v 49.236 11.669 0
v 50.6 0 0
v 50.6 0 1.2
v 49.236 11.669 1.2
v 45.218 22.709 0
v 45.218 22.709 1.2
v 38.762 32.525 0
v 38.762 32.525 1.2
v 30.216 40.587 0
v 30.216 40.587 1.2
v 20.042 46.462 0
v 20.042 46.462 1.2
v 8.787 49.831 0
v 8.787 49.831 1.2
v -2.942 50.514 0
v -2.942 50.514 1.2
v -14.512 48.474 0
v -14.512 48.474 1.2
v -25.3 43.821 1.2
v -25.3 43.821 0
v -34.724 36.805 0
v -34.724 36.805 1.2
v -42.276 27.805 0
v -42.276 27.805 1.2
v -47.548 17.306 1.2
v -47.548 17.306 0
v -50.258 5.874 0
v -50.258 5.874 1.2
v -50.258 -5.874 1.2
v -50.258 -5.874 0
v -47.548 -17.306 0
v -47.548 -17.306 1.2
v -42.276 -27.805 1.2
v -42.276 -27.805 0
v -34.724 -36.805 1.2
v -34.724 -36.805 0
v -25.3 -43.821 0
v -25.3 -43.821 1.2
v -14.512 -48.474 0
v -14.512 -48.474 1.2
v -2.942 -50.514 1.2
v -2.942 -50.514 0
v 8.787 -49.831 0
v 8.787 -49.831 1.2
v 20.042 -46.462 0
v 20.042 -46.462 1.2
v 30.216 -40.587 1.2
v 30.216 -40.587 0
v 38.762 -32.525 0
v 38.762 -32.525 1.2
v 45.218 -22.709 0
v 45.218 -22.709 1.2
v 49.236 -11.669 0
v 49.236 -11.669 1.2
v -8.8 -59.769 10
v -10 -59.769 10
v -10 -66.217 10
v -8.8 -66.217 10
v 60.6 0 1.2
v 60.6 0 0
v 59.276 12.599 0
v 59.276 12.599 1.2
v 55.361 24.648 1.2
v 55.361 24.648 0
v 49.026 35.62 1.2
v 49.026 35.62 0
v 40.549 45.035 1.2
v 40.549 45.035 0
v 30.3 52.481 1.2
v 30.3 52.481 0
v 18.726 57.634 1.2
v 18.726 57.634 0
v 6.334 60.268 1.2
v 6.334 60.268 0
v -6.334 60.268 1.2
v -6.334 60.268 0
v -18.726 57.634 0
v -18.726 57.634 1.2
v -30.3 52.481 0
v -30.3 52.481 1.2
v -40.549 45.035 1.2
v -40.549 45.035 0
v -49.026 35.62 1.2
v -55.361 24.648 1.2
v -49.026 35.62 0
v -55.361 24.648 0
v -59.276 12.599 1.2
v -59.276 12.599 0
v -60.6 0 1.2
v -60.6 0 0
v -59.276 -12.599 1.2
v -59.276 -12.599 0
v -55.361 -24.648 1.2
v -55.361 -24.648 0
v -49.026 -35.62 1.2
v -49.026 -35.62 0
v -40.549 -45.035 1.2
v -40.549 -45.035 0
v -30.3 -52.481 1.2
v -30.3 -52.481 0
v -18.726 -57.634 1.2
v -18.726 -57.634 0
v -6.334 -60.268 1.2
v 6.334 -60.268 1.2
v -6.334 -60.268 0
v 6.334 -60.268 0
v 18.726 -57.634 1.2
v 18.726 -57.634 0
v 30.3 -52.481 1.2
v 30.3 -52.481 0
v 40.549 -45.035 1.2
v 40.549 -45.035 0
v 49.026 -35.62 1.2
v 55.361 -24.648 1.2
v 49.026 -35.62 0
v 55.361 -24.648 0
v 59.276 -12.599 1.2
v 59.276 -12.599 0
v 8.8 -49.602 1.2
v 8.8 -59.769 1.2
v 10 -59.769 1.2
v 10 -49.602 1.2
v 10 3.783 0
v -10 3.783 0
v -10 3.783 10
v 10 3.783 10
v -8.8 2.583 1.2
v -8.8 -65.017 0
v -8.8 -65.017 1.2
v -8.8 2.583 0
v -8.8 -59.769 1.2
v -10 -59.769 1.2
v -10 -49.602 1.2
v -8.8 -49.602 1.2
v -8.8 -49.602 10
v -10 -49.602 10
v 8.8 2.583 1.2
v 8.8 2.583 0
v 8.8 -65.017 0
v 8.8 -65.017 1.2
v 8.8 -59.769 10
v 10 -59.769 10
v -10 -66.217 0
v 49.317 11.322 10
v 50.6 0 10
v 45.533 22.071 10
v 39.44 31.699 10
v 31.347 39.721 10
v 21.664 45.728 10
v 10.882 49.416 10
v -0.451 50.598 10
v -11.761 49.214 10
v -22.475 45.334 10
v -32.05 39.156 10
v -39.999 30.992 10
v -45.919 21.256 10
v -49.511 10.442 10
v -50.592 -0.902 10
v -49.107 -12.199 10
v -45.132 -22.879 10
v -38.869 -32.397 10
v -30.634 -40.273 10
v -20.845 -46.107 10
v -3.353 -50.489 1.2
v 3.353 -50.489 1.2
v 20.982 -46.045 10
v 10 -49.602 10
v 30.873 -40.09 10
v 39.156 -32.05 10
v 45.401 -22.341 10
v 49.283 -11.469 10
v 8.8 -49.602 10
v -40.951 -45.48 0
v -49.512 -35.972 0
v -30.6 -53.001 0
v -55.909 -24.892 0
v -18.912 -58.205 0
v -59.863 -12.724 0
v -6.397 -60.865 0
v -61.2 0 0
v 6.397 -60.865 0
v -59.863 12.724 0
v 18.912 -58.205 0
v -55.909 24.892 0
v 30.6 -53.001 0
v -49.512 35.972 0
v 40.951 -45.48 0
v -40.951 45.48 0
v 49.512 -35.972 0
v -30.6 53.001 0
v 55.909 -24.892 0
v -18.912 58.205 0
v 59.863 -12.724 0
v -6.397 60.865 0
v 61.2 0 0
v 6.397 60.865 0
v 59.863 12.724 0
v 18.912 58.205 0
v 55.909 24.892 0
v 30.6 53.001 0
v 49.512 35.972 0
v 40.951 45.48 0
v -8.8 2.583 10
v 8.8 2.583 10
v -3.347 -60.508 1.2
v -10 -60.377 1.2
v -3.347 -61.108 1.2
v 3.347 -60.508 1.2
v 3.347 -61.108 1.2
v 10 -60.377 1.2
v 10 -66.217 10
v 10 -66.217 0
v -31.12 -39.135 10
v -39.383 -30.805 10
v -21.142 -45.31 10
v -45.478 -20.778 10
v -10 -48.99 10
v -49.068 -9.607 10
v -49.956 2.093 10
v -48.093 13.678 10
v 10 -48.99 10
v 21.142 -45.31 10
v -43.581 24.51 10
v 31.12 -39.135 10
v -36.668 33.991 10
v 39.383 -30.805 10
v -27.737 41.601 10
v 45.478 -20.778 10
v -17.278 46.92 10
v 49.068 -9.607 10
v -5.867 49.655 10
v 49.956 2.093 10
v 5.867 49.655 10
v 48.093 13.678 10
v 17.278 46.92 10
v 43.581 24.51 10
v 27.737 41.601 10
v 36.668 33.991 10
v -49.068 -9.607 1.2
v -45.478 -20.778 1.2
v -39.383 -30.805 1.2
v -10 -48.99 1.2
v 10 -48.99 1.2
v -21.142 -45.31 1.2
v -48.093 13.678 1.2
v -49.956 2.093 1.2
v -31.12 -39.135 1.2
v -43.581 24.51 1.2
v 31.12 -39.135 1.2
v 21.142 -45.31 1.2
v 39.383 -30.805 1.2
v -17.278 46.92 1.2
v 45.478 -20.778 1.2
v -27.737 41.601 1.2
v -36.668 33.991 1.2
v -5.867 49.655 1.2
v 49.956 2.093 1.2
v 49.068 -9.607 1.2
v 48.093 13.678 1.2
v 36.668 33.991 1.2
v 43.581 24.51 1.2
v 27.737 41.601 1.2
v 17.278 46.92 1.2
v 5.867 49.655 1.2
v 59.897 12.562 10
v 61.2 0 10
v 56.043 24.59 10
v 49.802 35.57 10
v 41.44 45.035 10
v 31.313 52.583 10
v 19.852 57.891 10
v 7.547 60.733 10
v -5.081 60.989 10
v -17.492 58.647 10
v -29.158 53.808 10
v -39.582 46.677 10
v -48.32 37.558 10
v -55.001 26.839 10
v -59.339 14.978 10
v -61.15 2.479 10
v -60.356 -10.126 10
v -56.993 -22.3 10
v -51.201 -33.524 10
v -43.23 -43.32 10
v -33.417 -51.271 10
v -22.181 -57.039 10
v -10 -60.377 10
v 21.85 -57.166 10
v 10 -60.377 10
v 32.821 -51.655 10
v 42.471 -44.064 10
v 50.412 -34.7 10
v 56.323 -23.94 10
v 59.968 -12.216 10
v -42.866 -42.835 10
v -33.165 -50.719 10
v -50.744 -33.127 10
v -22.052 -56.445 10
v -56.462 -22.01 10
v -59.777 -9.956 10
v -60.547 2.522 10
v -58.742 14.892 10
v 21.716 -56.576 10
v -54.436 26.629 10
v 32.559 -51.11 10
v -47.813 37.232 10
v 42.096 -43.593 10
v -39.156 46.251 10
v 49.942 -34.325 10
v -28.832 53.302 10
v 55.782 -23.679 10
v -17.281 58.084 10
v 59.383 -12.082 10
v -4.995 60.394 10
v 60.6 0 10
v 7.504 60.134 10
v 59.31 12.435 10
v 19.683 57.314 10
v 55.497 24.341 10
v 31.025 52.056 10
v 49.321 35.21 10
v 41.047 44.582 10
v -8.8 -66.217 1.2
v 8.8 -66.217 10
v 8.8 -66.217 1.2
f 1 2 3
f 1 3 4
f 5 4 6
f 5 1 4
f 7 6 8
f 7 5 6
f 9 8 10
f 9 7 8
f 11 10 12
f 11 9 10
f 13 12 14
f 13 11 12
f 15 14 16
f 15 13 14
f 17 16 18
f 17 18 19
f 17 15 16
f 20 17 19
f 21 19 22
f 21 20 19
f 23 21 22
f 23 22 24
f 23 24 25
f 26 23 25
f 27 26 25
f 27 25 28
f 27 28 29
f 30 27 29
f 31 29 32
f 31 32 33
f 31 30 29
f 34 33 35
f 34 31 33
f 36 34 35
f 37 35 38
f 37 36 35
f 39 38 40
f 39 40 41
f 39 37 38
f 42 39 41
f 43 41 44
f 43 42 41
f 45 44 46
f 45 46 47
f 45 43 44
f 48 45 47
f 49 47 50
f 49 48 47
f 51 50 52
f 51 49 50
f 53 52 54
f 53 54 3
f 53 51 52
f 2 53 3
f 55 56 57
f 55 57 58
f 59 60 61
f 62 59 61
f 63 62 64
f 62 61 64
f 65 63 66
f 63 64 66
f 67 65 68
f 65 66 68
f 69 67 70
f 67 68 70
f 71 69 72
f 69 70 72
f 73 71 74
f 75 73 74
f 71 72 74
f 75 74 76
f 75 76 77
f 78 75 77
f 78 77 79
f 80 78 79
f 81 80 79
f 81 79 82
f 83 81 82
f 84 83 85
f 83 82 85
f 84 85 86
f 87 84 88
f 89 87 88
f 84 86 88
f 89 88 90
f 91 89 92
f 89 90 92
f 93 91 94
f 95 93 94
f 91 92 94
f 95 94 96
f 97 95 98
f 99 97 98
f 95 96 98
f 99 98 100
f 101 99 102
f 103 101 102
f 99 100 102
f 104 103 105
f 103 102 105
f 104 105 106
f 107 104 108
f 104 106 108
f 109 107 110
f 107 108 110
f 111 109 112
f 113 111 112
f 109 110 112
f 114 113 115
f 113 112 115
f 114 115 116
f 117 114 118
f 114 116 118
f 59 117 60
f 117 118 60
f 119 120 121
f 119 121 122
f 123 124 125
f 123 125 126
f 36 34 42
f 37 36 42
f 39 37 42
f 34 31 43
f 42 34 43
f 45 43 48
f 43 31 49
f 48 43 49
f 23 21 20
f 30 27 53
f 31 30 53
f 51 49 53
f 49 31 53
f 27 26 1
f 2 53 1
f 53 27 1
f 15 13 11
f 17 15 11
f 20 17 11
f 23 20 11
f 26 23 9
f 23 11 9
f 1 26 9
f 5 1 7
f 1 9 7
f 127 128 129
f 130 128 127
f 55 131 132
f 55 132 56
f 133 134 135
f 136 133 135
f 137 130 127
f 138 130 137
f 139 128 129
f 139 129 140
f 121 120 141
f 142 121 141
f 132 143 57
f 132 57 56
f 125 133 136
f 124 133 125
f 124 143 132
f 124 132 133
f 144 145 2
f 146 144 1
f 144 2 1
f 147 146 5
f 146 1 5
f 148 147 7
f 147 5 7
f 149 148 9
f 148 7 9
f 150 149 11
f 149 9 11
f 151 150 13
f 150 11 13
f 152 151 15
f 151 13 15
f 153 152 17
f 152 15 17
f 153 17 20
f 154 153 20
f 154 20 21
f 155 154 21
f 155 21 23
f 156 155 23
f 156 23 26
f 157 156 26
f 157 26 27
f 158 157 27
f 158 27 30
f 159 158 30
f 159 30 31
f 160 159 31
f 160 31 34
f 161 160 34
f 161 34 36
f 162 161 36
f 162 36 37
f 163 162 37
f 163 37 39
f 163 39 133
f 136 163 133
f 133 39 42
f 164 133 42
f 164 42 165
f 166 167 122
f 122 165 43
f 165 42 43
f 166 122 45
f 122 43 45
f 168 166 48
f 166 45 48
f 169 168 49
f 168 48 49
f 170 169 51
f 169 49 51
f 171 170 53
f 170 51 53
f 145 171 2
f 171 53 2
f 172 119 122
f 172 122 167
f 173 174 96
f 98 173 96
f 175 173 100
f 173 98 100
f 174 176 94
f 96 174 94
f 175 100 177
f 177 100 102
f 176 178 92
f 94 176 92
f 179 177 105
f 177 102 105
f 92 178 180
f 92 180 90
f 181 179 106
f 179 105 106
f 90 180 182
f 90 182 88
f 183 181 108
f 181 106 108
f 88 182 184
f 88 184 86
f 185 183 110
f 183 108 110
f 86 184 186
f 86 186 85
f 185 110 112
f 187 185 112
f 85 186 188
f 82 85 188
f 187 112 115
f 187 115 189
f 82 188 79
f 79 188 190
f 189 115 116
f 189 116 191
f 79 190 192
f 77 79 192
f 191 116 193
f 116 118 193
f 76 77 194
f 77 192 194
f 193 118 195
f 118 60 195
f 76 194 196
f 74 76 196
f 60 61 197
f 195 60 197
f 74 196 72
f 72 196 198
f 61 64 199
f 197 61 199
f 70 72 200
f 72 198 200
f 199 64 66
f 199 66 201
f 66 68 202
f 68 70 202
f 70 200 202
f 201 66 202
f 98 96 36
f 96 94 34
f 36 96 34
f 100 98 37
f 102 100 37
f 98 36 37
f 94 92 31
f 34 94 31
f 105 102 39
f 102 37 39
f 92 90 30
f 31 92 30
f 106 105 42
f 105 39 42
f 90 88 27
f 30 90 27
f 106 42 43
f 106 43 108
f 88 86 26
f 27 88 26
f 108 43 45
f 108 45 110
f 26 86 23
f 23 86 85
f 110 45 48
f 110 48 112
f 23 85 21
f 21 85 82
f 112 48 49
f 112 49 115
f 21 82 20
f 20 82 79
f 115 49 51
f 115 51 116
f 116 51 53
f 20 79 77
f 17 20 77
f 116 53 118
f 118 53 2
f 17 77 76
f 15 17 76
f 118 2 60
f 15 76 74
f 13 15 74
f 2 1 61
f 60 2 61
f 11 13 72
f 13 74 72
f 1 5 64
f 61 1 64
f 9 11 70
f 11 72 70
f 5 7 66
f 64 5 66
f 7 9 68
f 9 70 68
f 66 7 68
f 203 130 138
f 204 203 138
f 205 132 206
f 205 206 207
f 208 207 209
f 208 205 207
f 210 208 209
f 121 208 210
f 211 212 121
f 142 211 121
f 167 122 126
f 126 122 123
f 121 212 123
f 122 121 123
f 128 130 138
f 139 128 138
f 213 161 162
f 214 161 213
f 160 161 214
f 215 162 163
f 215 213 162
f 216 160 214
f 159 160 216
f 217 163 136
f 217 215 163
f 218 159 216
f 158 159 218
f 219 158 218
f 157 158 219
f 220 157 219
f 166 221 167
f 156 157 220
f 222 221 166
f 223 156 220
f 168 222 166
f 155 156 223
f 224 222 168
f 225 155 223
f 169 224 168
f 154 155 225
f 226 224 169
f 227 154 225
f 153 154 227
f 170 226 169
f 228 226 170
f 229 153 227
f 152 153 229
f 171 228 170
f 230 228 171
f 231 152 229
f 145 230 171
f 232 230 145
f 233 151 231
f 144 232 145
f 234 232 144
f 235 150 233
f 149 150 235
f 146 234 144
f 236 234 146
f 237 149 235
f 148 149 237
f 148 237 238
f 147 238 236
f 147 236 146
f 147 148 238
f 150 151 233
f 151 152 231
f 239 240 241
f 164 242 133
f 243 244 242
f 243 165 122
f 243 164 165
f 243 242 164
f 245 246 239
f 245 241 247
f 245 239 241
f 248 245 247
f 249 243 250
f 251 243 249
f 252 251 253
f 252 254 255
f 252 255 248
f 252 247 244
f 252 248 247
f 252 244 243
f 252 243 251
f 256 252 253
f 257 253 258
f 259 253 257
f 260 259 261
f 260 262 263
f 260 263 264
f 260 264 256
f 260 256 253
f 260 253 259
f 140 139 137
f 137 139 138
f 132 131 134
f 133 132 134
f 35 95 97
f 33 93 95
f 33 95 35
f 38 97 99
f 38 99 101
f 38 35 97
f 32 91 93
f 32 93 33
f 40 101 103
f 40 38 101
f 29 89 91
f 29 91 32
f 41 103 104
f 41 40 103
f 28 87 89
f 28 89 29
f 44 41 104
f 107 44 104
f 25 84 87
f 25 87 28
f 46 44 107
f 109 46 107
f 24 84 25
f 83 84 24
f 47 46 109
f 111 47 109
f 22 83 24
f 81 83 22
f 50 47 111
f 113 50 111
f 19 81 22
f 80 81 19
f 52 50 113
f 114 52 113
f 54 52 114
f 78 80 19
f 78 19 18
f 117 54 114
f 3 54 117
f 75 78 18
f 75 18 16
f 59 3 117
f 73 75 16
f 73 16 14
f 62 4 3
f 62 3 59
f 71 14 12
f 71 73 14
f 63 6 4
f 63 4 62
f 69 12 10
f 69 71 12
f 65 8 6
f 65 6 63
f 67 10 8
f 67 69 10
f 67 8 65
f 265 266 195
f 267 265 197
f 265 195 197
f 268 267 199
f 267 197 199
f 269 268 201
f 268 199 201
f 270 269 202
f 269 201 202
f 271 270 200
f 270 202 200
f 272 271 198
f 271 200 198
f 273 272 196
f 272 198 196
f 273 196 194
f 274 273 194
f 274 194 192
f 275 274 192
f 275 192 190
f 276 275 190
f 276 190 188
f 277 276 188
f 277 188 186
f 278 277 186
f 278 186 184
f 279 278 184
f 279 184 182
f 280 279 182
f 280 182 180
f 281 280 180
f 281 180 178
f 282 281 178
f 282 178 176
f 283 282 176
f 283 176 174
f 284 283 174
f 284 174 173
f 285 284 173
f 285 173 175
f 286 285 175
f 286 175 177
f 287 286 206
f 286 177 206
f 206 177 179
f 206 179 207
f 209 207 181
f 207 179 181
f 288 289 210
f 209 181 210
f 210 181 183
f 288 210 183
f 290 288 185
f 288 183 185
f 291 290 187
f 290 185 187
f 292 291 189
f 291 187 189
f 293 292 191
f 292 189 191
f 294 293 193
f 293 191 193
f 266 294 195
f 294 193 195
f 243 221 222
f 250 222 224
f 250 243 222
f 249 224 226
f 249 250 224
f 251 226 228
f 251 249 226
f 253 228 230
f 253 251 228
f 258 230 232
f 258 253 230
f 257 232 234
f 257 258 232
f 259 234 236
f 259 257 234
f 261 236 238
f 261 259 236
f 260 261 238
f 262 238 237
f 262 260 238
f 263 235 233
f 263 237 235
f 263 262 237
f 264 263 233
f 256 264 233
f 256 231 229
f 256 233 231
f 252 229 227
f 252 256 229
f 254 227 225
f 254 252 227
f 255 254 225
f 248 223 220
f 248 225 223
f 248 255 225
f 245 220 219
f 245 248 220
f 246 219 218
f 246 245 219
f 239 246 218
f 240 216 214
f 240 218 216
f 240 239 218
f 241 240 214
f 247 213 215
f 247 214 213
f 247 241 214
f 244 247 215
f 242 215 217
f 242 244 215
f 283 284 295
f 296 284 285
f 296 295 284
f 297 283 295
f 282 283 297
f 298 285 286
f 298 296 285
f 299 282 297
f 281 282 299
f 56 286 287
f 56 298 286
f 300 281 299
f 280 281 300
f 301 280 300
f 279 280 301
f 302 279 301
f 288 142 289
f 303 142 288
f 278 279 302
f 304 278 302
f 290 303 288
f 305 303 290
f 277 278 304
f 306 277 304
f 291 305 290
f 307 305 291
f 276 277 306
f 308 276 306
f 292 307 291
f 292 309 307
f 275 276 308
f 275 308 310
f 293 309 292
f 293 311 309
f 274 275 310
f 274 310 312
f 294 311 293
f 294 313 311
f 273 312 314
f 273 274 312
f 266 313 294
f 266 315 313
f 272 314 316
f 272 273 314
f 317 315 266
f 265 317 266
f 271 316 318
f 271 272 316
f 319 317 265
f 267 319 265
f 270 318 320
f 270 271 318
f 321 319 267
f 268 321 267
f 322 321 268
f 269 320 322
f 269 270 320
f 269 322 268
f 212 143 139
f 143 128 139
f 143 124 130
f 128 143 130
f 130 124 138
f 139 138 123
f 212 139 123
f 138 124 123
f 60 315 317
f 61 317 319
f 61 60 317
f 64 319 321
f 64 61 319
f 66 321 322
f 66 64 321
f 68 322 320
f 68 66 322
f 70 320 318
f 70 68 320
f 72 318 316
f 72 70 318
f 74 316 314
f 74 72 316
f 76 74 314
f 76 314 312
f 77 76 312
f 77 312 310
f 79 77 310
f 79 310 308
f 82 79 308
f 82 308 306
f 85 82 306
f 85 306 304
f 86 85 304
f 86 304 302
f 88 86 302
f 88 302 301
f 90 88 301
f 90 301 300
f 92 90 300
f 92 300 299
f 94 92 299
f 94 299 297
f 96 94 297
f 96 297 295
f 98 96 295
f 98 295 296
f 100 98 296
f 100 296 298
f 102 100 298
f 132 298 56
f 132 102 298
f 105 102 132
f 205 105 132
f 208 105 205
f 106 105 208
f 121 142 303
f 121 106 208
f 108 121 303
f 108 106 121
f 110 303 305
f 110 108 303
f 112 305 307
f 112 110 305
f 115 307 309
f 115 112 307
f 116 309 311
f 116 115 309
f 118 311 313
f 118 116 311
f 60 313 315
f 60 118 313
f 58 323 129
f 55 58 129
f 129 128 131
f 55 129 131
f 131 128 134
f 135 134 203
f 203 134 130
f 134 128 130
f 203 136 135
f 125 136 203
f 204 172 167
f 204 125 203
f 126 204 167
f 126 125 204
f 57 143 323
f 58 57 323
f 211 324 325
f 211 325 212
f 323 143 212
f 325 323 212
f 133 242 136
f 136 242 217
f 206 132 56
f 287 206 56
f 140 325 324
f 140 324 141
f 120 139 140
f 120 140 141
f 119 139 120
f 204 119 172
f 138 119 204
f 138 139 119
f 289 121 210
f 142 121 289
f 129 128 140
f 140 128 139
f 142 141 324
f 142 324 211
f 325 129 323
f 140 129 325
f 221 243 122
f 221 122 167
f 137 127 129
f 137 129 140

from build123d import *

# Parameters (mm, degrees)
F0_R           = 50.6
F0_R_2         = 50
F2_DEPTH       = 10
F1_R           = 50
F3_DEPTH       = 1.2
F4_R           = 61.2
F4_R_2         = 60.6
F6_DEPTH       = 10
F5_R           = 60.6
F5_R_2         = 50.6
F7_DEPTH       = 1.2
F8_W           = 20
F8_H           = 8.8
F9_DEPTH       = 80
F10_W          = 20
F10_H          = 70
F10_W_2        = 17.6
F10_H_2        = 67.6
F11_DEPTH      = 10
F12_W          = 17.6
F12_H          = 67.6
F13_DEPTH      = 1.2
F14_W          = 10.167207
F14_H          = 8.8
F15_DEPTH      = 10
F15_DEPTH_BACK = 10
F16_W          = 17.6
F16_H          = 8.8
F17_DEPTH      = 70


with BuildPart() as f2:
    # F0 (on Top) → F2 (new body)
    with BuildSketch(Plane.XY):
        Circle(F0_R)
        Circle(F0_R_2, mode=Mode.SUBTRACT)
    extrude(amount=F2_DEPTH)

    # F1 (on Top) → F3 (join)
    with BuildSketch(Plane.XY):
        Circle(F1_R)
    extrude(amount=F3_DEPTH)


with BuildPart() as f6:
    # F4 (on Top) → F6 (new body)
    with BuildSketch(Plane.XY):
        Circle(F4_R)
        Circle(F4_R_2, mode=Mode.SUBTRACT)
    extrude(amount=F6_DEPTH)


with BuildPart() as f7:
    # F5 (on Top) → F7 (new body)
    with BuildSketch(Plane.XY):
        Circle(F5_R)
        Circle(F5_R_2, mode=Mode.SUBTRACT)
    extrude(amount=F7_DEPTH)


with BuildPart() as f9_tool:
    # F8 (on Front) → F9 (new body)
    with BuildSketch(Plane.XZ):
        with Locations((0, 5.6)):
            Rectangle(F8_W, F8_H)
    extrude(amount=F9_DEPTH)


with BuildPart() as f2_1:
    add(f2.part)

    # F9: cut by f9_tool
    add(f9_tool.part, mode=Mode.SUBTRACT)


with BuildPart() as f6_1:
    add(f6.part)

    # F9: cut by f9_tool
    add(f9_tool.part, mode=Mode.SUBTRACT)


with BuildPart() as f11:
    # F10 (on Top) → F11 (new body)
    with BuildSketch(Plane.XY):
        with Locations((0, -31.217196)):
            Rectangle(F10_W, F10_H)
        with Locations((0, -31.217196)):
            Rectangle(F10_W_2, F10_H_2, mode=Mode.SUBTRACT)
    extrude(amount=F11_DEPTH)

    # F14 (on Right) → F15 (cut, two sides)
    with BuildSketch(Plane.YZ) as f15_sk:
        with Locations((-54.68562, 5.6)):
            Rectangle(F14_W, F14_H)
    extrude(amount=F15_DEPTH, mode=Mode.SUBTRACT)
    extrude(f15_sk.sketch, amount=-F15_DEPTH_BACK, mode=Mode.SUBTRACT)

    # F16 (on Front) → F17 (cut)
    with BuildSketch(Plane.XZ):
        with Locations((0, 5.6)):
            Rectangle(F16_W, F16_H)
    extrude(amount=F17_DEPTH, mode=Mode.SUBTRACT)


with BuildPart() as f13:
    # F12 (on Top) → F13 (new body)
    with BuildSketch(Plane.XY):
        with Locations((0, -31.217196)):
            Rectangle(F12_W, F12_H)
    extrude(amount=F13_DEPTH)


solid = Compound([f7.part, f2_1.part, f6_1.part, f11.part, f13.part])
